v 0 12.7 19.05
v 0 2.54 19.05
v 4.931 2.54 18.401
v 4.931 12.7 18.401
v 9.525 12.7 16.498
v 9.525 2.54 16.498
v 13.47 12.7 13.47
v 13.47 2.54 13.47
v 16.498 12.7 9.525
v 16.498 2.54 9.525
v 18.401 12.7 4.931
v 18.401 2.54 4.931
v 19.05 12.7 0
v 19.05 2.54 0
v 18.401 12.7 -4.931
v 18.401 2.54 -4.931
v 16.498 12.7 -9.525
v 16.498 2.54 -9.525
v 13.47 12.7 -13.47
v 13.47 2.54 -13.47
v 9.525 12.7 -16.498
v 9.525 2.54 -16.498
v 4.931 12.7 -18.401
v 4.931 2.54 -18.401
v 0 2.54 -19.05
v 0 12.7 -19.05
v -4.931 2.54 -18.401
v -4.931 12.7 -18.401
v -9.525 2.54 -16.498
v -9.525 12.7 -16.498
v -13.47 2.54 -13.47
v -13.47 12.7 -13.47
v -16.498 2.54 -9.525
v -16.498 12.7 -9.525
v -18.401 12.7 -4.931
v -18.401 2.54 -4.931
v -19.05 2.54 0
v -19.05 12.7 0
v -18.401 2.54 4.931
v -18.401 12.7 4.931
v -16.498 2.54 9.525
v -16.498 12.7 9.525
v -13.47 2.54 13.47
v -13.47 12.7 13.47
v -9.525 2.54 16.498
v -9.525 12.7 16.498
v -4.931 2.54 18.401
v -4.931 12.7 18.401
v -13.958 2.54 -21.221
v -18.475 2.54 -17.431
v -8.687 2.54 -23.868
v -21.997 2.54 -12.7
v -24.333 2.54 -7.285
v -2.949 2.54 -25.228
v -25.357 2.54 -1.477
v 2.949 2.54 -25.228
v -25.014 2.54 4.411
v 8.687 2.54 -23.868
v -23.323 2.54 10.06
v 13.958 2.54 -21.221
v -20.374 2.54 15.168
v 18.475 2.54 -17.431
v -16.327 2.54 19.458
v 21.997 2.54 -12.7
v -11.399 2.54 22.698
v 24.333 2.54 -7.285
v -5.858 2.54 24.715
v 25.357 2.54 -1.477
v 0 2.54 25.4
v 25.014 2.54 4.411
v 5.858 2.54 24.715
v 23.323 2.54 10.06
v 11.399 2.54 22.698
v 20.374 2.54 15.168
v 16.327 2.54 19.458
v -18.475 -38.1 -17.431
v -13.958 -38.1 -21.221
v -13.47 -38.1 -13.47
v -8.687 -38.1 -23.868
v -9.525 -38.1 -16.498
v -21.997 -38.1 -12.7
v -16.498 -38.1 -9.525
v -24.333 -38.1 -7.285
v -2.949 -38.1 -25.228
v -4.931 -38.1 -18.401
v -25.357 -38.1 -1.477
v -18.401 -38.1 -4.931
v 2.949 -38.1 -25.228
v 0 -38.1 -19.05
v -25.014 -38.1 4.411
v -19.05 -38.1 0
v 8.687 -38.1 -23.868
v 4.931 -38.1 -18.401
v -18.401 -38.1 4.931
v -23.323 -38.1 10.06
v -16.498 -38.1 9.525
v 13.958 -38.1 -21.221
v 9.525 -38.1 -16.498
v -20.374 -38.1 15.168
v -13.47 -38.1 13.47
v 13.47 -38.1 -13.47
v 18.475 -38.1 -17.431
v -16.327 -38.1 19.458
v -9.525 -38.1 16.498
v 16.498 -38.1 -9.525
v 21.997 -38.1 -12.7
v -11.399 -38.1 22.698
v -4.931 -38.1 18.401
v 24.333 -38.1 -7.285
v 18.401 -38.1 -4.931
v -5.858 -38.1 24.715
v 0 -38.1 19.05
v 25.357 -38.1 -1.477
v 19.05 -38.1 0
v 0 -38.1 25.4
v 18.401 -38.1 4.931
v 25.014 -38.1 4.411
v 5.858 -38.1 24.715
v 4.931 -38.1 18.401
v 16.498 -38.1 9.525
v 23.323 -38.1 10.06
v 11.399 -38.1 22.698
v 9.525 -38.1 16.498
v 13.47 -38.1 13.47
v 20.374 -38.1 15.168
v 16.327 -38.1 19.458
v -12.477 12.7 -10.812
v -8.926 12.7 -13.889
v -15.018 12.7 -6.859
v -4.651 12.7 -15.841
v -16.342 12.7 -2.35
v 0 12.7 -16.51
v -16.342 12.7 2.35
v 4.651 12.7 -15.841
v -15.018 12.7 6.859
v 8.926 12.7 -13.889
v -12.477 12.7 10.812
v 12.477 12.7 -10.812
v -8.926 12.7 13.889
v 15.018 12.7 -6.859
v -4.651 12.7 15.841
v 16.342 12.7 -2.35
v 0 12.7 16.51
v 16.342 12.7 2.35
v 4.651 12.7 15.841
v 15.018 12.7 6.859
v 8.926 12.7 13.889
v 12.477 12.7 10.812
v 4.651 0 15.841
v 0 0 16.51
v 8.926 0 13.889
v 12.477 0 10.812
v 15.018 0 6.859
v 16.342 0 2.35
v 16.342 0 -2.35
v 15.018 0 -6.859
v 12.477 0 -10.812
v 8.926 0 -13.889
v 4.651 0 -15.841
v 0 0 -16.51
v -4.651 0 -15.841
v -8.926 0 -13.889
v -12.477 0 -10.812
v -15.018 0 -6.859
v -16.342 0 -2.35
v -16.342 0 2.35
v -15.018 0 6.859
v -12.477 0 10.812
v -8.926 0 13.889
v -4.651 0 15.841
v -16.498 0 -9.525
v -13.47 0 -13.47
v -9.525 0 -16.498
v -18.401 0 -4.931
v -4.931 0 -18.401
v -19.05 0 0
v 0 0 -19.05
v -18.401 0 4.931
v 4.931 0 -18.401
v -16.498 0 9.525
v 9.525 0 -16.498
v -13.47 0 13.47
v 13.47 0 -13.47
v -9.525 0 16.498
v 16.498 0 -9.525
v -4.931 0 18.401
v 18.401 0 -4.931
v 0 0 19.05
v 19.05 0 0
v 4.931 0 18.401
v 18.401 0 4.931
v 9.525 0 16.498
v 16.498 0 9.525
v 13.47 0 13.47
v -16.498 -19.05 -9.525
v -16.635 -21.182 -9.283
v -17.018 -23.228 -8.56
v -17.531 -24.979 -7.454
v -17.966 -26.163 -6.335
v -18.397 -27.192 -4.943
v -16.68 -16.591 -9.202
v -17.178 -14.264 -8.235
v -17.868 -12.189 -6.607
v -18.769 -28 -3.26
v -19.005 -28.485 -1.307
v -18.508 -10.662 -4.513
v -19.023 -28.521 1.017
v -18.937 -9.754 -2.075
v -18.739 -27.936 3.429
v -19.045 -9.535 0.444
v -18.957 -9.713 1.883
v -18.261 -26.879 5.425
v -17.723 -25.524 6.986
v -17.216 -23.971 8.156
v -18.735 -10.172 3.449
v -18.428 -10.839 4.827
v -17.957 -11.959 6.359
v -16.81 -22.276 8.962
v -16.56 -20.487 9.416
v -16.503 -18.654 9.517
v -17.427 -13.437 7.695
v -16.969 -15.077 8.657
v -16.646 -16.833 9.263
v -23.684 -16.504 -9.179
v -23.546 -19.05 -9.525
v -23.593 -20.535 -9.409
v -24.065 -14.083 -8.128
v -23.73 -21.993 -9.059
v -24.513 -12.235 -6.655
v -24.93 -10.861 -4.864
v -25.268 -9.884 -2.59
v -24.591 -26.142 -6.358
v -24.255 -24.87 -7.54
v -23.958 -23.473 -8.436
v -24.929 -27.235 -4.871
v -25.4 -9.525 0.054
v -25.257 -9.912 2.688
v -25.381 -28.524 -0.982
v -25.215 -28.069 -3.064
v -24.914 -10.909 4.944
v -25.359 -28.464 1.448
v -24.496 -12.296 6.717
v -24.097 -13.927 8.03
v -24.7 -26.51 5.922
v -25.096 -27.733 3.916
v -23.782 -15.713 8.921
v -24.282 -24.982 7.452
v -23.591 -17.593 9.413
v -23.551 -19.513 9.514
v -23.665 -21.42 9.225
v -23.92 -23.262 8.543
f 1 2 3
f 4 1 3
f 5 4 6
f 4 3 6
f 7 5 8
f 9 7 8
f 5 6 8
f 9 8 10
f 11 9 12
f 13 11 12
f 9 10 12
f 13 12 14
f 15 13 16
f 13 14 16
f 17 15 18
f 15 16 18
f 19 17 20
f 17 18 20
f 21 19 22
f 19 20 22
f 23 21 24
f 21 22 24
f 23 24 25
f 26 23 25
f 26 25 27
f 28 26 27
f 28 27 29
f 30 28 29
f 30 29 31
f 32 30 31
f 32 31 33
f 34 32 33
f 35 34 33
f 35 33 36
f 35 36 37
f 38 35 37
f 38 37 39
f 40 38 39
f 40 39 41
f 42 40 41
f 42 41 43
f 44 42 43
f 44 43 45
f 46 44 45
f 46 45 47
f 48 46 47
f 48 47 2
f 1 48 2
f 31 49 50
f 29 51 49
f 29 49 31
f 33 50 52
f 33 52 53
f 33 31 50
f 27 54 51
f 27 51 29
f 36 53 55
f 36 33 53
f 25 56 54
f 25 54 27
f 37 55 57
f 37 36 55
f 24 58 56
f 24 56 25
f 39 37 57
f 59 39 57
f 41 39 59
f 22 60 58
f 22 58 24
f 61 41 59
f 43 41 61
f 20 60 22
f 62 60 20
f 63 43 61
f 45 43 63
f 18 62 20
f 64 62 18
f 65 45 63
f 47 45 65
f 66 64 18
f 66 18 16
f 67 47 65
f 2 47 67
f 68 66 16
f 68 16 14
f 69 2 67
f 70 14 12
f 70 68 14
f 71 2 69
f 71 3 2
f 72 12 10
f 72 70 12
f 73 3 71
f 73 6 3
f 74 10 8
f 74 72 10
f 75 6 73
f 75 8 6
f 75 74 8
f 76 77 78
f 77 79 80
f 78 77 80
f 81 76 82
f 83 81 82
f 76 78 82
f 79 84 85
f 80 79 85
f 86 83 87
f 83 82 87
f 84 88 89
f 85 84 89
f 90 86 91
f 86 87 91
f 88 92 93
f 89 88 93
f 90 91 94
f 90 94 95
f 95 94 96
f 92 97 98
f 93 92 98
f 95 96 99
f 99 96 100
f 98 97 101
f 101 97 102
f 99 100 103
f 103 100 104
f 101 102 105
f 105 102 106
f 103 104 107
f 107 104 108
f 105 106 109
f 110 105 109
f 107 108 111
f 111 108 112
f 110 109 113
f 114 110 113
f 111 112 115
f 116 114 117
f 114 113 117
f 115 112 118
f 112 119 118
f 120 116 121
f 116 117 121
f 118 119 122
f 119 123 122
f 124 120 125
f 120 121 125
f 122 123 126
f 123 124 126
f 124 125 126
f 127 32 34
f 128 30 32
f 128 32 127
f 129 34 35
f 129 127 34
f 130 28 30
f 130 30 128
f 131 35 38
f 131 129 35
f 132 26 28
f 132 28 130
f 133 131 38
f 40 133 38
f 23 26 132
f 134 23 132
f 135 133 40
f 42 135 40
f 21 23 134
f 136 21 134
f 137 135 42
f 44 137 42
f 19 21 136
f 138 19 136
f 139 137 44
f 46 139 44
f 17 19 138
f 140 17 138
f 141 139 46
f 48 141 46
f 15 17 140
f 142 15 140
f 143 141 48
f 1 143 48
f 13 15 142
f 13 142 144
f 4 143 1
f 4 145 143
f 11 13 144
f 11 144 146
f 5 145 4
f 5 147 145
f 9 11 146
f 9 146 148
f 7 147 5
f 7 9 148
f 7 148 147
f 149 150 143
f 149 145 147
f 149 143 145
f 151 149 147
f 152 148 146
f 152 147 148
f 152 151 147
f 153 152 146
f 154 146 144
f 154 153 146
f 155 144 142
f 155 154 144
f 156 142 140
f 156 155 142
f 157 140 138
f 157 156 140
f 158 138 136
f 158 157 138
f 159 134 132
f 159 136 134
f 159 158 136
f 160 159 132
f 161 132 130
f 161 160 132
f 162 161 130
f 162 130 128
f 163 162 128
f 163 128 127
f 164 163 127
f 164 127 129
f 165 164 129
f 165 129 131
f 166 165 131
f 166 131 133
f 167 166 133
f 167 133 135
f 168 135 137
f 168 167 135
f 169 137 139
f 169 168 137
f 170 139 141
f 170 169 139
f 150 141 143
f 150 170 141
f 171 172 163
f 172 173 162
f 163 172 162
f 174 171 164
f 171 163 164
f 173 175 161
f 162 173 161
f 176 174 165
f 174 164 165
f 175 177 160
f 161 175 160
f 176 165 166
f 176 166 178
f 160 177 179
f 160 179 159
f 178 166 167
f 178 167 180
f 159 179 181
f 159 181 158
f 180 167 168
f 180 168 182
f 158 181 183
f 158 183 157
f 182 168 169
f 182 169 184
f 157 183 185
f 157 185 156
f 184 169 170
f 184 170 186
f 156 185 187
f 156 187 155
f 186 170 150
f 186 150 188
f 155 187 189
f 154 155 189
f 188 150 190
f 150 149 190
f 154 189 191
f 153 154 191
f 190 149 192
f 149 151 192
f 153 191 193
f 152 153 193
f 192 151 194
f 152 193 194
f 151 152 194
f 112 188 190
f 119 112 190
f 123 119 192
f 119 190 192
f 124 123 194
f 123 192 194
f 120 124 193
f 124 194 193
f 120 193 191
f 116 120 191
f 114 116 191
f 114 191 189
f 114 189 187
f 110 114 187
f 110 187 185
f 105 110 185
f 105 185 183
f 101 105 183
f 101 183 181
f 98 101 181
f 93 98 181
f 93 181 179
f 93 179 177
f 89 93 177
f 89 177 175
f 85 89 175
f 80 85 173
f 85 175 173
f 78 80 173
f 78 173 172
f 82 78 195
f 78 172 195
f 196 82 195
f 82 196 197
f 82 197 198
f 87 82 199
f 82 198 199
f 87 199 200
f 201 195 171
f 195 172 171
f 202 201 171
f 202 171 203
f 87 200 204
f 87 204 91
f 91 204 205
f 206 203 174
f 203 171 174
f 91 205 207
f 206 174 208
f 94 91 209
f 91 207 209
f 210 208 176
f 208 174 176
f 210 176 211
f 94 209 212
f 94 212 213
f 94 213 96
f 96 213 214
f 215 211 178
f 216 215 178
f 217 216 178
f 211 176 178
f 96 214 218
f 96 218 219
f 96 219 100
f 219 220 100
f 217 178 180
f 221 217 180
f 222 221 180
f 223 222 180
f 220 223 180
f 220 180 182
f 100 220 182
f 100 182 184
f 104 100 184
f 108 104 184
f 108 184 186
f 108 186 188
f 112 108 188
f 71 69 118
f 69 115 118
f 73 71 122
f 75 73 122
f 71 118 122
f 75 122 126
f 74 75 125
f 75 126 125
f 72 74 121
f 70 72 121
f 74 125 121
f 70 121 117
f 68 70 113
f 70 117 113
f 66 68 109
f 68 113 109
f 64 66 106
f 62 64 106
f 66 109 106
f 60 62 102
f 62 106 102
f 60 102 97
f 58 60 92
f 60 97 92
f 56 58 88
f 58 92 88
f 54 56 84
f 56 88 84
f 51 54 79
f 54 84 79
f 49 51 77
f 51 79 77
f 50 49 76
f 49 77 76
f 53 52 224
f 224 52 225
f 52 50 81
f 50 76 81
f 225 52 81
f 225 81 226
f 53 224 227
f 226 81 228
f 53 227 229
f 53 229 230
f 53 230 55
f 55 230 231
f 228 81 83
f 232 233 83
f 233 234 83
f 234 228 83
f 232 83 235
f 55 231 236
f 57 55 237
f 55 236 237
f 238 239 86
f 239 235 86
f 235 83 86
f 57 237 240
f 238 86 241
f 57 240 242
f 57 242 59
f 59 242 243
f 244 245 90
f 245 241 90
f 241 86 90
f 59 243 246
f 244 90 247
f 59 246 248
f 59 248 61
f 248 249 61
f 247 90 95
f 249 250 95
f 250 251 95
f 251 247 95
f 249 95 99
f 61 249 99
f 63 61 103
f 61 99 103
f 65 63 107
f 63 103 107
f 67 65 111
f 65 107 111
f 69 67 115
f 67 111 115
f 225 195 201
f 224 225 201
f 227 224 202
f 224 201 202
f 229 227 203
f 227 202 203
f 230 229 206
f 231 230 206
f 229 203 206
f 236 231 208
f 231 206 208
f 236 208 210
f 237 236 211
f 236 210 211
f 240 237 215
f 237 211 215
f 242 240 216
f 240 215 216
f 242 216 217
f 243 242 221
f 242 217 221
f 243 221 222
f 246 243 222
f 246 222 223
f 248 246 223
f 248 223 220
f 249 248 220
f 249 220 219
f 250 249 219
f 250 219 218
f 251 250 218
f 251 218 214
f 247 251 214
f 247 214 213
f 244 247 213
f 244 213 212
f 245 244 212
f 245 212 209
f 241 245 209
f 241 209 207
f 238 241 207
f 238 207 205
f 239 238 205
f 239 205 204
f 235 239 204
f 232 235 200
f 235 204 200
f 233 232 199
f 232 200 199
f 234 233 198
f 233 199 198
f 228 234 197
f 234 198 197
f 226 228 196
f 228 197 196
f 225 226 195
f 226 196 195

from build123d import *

# Parameters (mm, degrees)
SKETCH2_R           = 19.05
BOSS_EXTRUDE1_DEPTH = 12.7
SKETCH2_5_R         = 25.4
SKETCH2_5_R_2       = 19.05
BOSS_EXTRUDE3_DEPTH = 38.1
SHELL2_T            = -2.54
SKETCH32_R          = 9.525
CUT_EXTRUDE1_DEPTH  = 50.8
SKETCH2_10_R        = 25.4
SKETCH2_10_R_2      = 19.05
BOSS_EXTRUDE4_DEPTH = 2.54


with BuildPart() as part:
    # Sketch2 → Boss-Extrude1 (new body)
    with BuildSketch(Plane(origin=(0, 0, 0), x_dir=(1, 0, 0), z_dir=(0, 1, 0))):
        Circle(SKETCH2_R)
    extrude(amount=BOSS_EXTRUDE1_DEPTH)

    # Shell2
    shell2_openings = [part.faces().sort_by_distance(p)[0] for p in [
        (0, 0, 0),
        (0, 12.7, 0),
    ]]
    offset(amount=SHELL2_T, openings=shell2_openings, kind=Kind.INTERSECTION)



with BuildPart() as body_2:
    # Sketch2<5> → Boss-Extrude3 (new body)
    with BuildSketch(Plane(origin=(0, 0, 0), x_dir=(1, 0, 0), z_dir=(0, 1, 0))):
        Circle(SKETCH2_5_R)
        Circle(SKETCH2_5_R_2, mode=Mode.SUBTRACT)
    extrude(amount=-BOSS_EXTRUDE3_DEPTH)

    # Sketch32 → Cut-Extrude1 (cut)
    with BuildSketch(Plane(origin=(0, 0, 0), x_dir=(0, 0, -1), z_dir=(1, 0, 0))):
        with Locations((0, -19.05)):
            Circle(SKETCH32_R)
    extrude(amount=-CUT_EXTRUDE1_DEPTH, mode=Mode.SUBTRACT)


with BuildPart() as part_1:
    add(part.part)

    add(body_2.part)  # Boss-Extrude4 merges body 2
    # Sketch2<10> → Boss-Extrude4 (add)
    with BuildSketch(Plane(origin=(0, 0, 0), x_dir=(1, 0, 0), z_dir=(0, 1, 0))):
        Circle(SKETCH2_10_R)
        Circle(SKETCH2_10_R_2, mode=Mode.SUBTRACT)
    extrude(amount=BOSS_EXTRUDE4_DEPTH)


solid = part_1.part
